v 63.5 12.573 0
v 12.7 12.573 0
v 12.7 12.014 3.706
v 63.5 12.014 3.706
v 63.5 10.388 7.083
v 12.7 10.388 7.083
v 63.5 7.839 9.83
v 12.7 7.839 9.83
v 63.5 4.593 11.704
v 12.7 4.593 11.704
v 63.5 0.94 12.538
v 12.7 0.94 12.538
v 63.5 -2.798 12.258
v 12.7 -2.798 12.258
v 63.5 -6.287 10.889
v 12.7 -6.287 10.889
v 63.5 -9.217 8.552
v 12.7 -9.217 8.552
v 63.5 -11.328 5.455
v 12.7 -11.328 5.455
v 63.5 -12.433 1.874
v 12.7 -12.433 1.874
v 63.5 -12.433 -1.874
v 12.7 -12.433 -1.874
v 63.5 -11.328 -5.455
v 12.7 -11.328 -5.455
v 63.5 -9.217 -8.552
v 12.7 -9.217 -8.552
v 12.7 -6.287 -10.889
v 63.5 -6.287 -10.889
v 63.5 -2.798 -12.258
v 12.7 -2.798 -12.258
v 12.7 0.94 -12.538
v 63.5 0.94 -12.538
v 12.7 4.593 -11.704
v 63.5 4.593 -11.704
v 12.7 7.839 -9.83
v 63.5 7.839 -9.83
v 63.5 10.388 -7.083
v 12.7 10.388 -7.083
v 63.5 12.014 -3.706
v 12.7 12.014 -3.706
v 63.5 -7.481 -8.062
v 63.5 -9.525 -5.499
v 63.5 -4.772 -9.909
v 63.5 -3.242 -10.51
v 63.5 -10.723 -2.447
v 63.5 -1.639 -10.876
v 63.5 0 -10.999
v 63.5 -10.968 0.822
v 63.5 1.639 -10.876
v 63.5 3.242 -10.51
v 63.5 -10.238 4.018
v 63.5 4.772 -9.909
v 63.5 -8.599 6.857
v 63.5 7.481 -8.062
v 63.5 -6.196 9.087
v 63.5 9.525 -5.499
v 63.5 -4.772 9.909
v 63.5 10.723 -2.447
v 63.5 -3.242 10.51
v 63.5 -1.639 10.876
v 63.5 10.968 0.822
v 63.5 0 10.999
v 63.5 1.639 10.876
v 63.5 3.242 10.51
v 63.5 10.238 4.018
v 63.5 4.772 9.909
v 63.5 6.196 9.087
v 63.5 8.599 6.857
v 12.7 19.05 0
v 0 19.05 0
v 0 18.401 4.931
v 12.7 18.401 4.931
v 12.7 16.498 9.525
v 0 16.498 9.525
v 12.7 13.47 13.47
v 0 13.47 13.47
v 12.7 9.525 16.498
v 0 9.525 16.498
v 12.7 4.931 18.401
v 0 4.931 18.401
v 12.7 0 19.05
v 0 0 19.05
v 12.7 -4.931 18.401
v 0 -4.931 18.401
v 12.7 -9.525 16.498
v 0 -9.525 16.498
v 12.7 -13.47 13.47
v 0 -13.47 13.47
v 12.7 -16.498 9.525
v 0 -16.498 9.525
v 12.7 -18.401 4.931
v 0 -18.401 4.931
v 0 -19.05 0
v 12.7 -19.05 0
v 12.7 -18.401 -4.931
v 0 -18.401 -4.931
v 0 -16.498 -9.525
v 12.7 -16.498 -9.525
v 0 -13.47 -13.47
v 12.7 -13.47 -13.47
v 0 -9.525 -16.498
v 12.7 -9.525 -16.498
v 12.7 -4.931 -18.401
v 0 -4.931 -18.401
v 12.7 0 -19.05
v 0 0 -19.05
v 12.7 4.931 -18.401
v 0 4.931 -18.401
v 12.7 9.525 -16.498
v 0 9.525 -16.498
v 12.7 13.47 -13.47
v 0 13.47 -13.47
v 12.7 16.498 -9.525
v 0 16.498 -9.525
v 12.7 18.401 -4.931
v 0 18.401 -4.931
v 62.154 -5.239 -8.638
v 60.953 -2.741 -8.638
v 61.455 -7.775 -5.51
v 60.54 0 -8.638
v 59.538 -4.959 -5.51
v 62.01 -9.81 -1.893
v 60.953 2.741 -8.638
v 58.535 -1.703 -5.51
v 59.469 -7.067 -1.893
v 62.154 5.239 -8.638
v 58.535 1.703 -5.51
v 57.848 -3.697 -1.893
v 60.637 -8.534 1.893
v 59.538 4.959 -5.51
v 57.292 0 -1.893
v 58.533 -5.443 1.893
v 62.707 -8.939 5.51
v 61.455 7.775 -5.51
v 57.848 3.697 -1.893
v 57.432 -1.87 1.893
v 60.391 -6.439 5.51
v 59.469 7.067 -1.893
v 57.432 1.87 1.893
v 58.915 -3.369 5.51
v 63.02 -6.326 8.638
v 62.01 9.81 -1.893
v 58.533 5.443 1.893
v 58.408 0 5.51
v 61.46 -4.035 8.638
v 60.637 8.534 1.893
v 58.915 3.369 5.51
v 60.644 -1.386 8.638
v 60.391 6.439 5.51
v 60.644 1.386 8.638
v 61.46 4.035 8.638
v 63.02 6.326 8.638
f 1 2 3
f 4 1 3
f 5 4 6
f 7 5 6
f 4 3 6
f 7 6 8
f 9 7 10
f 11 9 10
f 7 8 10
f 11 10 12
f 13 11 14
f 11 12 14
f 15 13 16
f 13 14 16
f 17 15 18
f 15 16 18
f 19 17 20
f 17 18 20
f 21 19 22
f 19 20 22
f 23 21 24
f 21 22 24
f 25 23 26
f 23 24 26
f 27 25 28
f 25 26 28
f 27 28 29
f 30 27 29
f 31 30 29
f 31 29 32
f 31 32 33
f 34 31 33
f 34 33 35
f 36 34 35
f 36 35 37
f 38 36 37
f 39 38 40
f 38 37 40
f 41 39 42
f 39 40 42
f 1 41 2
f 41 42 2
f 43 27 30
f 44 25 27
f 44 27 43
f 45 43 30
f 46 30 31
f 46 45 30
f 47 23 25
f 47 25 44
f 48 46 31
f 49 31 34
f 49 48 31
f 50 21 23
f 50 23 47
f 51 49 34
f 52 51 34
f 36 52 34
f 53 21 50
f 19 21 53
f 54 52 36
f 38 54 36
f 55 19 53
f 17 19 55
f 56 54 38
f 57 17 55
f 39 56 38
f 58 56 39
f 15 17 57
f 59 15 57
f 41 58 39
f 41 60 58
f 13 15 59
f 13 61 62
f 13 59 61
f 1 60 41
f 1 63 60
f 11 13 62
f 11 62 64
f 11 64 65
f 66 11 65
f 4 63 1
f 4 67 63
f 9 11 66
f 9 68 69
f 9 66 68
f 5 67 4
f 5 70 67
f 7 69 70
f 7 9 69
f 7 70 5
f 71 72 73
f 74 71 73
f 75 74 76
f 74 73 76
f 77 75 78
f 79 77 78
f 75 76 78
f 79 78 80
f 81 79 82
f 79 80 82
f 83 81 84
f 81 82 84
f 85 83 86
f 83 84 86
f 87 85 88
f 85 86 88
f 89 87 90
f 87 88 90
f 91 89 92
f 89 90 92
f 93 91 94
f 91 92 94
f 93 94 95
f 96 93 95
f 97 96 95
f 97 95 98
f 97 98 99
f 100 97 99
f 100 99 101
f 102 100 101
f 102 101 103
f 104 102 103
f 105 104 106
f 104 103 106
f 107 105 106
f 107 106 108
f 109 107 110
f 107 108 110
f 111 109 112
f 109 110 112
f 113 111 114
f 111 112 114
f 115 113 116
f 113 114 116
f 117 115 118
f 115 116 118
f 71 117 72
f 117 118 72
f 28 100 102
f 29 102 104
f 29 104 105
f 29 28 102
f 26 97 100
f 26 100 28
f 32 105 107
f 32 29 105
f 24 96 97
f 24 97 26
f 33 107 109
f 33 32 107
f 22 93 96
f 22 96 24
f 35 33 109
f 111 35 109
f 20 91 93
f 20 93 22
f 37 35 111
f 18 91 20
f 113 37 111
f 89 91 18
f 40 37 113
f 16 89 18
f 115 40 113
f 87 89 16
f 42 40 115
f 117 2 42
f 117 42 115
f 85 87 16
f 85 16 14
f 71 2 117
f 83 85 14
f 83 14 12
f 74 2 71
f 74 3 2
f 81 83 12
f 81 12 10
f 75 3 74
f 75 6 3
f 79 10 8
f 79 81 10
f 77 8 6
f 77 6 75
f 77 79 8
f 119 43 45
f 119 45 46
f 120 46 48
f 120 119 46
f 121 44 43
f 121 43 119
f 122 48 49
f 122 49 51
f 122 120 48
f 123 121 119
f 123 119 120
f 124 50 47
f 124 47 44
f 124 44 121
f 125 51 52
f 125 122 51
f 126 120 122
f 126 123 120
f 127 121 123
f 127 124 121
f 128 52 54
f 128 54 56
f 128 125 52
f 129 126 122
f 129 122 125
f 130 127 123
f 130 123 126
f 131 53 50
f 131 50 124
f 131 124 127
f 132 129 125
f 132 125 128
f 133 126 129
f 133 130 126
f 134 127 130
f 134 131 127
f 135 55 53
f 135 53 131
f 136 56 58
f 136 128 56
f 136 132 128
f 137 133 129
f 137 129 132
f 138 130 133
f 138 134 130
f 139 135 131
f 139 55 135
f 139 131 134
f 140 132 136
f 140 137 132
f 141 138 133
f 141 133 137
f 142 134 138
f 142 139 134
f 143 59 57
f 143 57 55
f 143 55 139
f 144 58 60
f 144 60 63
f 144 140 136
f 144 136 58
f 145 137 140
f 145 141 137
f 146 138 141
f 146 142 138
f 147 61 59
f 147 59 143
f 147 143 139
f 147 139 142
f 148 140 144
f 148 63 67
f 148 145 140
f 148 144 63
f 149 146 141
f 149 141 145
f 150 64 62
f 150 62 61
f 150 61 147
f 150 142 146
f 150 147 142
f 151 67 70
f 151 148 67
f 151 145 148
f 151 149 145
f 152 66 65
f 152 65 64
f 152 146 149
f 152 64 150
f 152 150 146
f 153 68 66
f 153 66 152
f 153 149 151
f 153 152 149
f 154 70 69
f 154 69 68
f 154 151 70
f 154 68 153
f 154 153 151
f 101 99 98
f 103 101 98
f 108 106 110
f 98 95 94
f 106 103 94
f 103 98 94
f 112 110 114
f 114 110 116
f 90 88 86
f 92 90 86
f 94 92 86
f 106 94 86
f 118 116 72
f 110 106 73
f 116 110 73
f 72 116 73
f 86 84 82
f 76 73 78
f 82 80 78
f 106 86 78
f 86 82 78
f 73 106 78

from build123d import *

# Parameters (mm, degrees)
F0_R     = 19.05
F1_DEPTH = 12.7
F2_R     = 12.573
F3_DEPTH = 50.8


with BuildPart() as f1:
    # F0 (on Right) → F1 (new body)
    with BuildSketch(Plane.YZ):
        Circle(F0_R)
    extrude(amount=F1_DEPTH)

    # F2 (on face) → F3 (join)
    with BuildSketch(Plane.YZ.offset(12.7)):
        Circle(F2_R)
    extrude(amount=F3_DEPTH)

    # F5 (on offset) → F6 (revolve, cut)
    with BuildSketch(Plane.YZ.offset(69.85)):
        with BuildLine():
            Line((0, 12.7), (0, -12.7))
            ThreePointArc((0, -12.7), (12.7, 0), (0, 12.7))
        make_face()
    revolve(axis=Axis((69.85, 0, 0), (0, 0, -1)), mode=Mode.SUBTRACT)


solid = f1.part
